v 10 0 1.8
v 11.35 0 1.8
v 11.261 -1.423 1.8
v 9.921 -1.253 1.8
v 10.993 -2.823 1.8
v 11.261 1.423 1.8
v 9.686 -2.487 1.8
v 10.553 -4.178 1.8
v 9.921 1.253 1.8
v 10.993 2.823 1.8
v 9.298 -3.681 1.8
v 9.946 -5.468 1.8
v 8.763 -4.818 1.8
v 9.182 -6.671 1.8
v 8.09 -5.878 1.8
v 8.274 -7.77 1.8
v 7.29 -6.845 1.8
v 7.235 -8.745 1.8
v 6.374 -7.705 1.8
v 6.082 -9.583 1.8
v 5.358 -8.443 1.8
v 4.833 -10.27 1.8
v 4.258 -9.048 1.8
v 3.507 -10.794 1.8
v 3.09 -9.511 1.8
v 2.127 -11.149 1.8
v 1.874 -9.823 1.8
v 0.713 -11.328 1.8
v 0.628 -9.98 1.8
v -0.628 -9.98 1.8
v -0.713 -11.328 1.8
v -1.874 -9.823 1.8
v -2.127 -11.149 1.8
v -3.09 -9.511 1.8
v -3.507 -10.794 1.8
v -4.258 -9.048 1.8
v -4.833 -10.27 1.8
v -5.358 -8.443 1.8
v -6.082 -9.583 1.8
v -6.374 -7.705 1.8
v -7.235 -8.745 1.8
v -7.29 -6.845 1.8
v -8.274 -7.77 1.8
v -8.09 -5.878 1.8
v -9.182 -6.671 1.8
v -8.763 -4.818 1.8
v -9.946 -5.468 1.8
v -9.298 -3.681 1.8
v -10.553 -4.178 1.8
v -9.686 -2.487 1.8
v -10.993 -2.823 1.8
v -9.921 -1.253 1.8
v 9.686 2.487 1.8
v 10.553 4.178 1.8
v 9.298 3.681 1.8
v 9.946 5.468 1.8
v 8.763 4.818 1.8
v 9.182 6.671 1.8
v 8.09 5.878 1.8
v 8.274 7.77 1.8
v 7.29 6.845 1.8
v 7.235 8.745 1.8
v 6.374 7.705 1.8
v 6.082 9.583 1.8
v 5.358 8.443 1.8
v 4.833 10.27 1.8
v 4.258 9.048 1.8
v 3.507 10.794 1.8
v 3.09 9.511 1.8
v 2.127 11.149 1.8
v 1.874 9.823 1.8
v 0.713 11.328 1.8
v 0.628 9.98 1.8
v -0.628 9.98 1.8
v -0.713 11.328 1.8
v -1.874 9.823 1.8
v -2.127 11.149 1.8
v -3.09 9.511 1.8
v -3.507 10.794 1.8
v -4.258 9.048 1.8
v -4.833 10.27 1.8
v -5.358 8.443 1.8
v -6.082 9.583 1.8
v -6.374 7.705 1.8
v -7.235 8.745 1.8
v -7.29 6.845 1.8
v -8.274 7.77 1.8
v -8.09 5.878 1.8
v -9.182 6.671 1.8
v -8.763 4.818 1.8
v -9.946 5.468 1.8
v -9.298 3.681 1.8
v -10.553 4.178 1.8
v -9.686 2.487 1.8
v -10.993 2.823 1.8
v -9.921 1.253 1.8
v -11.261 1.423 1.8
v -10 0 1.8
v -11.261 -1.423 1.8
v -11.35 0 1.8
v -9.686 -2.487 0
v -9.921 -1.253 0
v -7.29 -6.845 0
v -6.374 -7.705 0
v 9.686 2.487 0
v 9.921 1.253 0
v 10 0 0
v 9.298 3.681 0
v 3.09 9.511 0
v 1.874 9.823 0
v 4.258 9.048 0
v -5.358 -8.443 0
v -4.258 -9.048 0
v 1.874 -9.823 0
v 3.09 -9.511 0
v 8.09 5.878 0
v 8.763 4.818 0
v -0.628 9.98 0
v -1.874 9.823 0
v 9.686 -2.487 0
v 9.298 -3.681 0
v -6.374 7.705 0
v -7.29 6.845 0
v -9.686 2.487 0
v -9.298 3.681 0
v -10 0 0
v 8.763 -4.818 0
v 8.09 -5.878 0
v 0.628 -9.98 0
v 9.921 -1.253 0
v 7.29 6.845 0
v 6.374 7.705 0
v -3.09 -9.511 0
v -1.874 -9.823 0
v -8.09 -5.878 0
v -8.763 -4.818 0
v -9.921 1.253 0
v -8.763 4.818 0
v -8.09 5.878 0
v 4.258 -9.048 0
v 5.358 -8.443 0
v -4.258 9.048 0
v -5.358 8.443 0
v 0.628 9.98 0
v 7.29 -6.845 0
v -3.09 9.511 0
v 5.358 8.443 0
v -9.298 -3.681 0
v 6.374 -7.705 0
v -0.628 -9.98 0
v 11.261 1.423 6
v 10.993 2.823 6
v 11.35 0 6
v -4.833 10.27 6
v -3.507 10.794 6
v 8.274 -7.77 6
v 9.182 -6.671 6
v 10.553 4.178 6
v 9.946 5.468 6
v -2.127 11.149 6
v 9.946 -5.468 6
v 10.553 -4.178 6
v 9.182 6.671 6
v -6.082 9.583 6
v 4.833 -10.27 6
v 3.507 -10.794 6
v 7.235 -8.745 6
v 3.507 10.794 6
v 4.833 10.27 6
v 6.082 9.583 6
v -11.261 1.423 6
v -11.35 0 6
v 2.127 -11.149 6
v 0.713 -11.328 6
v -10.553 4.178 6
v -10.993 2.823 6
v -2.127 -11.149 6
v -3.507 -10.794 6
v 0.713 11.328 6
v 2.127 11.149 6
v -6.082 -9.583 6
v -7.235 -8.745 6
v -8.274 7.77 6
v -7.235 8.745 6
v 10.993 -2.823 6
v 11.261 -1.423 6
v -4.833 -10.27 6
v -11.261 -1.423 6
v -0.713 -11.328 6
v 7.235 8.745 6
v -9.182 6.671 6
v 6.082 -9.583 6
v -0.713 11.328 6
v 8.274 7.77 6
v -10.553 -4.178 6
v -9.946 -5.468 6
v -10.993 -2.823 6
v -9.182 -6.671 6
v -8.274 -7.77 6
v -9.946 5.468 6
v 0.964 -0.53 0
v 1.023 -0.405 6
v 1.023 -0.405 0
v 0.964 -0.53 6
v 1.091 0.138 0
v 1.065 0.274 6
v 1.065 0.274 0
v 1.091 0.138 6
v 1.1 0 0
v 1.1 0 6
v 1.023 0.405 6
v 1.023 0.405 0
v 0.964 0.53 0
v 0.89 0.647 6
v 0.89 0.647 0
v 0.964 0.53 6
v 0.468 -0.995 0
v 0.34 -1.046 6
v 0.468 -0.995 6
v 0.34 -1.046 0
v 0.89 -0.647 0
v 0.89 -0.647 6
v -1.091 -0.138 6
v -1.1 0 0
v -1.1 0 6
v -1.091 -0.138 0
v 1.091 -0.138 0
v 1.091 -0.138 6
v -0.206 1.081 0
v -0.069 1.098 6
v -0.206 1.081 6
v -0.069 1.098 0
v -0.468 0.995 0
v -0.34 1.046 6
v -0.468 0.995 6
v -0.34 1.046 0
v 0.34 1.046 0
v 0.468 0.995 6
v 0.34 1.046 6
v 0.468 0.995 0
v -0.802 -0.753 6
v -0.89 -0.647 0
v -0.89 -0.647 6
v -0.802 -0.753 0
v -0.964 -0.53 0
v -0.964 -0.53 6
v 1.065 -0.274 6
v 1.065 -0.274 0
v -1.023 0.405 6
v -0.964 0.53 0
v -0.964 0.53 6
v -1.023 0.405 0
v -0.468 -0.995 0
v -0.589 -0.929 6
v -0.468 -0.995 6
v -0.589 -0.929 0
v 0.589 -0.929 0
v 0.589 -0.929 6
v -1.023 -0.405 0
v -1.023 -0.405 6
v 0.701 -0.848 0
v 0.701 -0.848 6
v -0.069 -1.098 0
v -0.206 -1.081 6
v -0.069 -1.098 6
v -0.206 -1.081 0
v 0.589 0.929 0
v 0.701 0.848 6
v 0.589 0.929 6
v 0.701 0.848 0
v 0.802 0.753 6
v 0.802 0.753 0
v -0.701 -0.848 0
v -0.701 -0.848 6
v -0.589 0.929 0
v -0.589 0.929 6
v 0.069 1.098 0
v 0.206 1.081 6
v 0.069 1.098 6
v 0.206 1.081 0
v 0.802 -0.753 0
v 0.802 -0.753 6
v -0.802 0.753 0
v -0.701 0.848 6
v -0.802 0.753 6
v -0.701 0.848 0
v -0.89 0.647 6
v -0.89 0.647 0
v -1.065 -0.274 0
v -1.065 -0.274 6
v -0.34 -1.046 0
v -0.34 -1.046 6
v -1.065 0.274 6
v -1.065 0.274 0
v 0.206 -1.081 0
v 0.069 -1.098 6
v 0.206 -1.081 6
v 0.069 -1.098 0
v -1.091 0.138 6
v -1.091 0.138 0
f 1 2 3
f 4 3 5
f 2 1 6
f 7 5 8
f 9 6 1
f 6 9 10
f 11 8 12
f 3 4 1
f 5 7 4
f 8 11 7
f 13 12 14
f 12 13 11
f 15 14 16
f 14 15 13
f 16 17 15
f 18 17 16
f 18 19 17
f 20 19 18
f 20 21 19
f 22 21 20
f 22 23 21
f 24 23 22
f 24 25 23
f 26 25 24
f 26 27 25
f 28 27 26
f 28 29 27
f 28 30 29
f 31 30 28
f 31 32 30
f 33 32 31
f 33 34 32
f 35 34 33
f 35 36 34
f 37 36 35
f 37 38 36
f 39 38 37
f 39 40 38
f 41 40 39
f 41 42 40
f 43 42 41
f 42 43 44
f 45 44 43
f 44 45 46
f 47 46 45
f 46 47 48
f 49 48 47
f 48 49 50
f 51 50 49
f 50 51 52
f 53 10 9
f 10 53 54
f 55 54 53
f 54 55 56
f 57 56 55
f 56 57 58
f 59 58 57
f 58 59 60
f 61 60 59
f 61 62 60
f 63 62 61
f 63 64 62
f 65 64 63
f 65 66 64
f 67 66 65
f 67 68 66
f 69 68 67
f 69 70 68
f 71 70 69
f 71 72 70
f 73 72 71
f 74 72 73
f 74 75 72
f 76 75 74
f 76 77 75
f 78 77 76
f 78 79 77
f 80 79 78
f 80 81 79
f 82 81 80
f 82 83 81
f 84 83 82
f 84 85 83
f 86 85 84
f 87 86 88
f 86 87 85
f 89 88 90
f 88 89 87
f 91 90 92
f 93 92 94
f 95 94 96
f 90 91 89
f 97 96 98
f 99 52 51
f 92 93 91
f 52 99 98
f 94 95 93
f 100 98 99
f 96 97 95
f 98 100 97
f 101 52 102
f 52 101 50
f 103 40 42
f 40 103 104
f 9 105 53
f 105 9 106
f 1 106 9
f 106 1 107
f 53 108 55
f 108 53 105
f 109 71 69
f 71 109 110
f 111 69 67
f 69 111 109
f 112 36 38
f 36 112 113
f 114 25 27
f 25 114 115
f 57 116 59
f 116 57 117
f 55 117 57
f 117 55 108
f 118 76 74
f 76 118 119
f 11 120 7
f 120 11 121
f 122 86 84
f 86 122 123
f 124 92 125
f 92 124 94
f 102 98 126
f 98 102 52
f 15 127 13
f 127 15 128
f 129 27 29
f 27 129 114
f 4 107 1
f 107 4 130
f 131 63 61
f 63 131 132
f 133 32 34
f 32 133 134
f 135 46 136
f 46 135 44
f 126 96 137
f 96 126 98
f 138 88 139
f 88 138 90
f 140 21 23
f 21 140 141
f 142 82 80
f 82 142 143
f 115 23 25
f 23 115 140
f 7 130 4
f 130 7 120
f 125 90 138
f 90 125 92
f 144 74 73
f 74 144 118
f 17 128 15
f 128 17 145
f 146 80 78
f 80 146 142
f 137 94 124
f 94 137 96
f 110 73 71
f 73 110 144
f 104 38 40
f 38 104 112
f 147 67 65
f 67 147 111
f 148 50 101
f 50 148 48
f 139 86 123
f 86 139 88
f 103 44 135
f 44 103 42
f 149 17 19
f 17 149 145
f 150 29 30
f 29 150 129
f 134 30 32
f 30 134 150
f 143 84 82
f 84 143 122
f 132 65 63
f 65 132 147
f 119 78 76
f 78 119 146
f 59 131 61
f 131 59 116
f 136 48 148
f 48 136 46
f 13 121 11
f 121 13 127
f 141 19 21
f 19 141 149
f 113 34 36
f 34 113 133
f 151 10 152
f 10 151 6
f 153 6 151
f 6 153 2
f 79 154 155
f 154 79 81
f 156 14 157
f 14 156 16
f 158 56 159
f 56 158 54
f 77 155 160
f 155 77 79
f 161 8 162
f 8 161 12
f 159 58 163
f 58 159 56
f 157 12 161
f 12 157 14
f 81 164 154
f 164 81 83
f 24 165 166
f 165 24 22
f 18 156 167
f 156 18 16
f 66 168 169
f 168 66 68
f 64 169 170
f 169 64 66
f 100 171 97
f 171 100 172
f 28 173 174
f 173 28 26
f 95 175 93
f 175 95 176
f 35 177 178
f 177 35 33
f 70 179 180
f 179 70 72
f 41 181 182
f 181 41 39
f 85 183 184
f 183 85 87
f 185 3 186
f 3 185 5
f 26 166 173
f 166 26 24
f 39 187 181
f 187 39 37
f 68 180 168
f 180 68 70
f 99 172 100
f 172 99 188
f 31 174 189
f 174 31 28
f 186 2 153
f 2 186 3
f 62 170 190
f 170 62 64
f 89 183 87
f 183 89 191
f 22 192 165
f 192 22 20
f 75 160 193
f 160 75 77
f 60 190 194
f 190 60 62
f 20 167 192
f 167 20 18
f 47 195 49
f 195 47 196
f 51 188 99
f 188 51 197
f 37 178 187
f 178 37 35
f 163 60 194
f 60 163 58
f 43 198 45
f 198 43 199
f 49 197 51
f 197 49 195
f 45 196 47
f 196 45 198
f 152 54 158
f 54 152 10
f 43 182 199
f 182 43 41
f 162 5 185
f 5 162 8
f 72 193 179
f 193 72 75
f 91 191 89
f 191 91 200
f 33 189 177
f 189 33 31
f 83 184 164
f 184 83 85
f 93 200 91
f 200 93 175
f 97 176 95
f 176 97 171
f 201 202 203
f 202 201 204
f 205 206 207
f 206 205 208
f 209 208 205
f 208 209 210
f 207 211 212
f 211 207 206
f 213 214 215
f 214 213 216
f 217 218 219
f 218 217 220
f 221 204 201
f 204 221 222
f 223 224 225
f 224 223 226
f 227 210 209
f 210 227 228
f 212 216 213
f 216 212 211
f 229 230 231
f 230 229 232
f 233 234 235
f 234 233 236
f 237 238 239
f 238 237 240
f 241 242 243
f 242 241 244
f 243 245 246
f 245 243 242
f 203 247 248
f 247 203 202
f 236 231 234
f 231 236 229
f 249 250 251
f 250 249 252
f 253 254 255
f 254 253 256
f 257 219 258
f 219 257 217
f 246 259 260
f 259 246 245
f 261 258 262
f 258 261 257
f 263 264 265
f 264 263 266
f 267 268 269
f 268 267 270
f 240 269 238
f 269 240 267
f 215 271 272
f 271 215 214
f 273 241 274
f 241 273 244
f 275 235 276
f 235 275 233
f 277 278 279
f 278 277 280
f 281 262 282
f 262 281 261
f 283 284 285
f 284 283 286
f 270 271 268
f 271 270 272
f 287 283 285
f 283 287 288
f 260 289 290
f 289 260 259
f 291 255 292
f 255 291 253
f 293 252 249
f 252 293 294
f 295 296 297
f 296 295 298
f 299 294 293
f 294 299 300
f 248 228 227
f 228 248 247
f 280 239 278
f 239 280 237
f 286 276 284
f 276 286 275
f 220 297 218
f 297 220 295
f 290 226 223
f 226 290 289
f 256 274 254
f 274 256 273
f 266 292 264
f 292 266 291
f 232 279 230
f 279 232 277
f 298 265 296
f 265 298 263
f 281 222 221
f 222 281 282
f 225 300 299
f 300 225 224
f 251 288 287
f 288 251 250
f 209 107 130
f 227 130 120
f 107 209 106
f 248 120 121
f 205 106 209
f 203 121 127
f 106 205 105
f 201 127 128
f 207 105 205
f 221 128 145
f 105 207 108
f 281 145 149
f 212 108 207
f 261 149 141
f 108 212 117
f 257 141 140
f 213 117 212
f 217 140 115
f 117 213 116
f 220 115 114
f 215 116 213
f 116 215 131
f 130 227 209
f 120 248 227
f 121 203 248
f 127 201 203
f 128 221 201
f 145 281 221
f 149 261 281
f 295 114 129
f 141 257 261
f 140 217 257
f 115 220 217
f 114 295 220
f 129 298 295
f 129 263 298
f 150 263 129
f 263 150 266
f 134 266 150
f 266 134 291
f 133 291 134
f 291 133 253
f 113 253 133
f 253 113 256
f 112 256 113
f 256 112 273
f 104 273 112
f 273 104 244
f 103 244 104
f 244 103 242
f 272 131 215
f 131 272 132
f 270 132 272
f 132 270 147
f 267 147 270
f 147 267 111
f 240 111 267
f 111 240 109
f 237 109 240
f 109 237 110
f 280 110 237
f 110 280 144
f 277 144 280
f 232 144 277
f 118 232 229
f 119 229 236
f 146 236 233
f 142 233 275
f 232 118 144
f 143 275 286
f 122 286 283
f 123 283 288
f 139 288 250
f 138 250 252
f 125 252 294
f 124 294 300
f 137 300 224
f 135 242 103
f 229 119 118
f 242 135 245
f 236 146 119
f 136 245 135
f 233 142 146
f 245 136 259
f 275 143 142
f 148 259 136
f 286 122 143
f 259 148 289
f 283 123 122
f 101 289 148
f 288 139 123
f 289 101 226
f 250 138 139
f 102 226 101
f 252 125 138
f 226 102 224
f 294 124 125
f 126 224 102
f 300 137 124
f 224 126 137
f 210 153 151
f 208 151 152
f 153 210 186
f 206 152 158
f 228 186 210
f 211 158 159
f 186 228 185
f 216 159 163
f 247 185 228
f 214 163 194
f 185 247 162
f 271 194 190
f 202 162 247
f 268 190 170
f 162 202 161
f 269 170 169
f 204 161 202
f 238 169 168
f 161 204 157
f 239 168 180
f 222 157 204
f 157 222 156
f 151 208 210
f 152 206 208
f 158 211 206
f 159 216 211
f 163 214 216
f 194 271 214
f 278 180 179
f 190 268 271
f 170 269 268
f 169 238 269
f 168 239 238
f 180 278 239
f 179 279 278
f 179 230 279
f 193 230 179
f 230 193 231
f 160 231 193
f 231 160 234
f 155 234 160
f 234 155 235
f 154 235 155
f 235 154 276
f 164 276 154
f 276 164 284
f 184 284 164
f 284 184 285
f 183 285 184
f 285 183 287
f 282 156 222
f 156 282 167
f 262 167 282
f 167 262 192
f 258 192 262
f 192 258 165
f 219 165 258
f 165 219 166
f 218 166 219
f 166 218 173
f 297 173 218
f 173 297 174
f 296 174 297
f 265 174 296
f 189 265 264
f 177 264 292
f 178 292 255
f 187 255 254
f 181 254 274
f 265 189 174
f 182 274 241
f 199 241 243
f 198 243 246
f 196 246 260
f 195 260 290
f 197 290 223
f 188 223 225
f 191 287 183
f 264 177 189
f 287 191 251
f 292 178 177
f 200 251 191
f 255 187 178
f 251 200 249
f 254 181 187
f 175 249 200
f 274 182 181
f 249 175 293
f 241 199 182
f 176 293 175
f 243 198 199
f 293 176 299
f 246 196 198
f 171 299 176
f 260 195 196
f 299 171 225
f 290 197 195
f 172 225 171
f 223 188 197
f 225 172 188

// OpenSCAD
$fn = 50;


difference() {
	union() {
		*color(alpha = 1.0000000000, c = "gray") {
			translate(v = [0, 7, 0]) {
				linear_extrude(height = 12) {
					text(font = "Arial:style=Bold", halign = "center", size = 4.5000000000, text = "COMMENT bearing_plate_plate", valign = "center");
				}
			}
		}
		*color(alpha = 1.0000000000, c = "gray") {
			translate(v = [0, 14, 0]) {
				linear_extrude(height = 12) {
					text(font = "Arial:style=Bold", halign = "center", size = 4.5000000000, text = "COMMENT description oobb_cylinder_shape_p_type_12_depth_3_width_12_height_12_thickness_motor_servo_micro_01_shaft_p_t_12.0_radius_all_mode", valign = "center");
				}
			}
		}
		translate(v = [0, 0, -6.0000000000]) {
			cylinder(h = 12, r = 12.0000000000);
		}
		*color(alpha = 1.0000000000, c = "gray") {
			translate(v = [0, 7, 0]) {
				linear_extrude(height = 1) {
					text(font = "Arial:style=Bold", halign = "center", size = 4.5000000000, text = "COMMENT bearing_plate_slice", valign = "center");
				}
			}
		}
	}
	union() {
		translate(v = [18.0000000000, 0, -6.0000000000]) {
			rotate(a = [0, 180, 30.0000000000]) {
				difference() {
					union() {
						translate(v = [0, 0, -12.0000000000]) {
							cylinder(h = 12, r = 1.5000000000);
						}
						translate(v = [0, 0, -12.0000000000]) {
							linear_extrude(height = 2.5000000000) {
								polygon(points = [[3.4620000000, 0.0000000000], [1.7310000000, 2.9981799479], [-1.7310000000, 2.9981799479], [-3.4620000000, 0.0000000000], [-1.7310000000, -2.9981799479], [1.7310000000, -2.9981799479]]);
							}
						}
						translate(v = [-1.7500000000, -3.2500000000, -9.5000000000]) {
							cube(size = [3.5000000000, 6.5000000000, 0.3000000000]);
						}
						translate(v = [-1.7500000000, -1.7500000000, -9.2000000000]) {
							cube(size = [3.5000000000, 3.5000000000, 0.3000000000]);
						}
						translate(v = [-1.7500000000, -3.2500000000, -12.3000000000]) {
							cube(size = [3.5000000000, 6.5000000000, 0.3000000000]);
						}
						translate(v = [-1.7500000000, -1.7500000000, -12.6000000000]) {
							cube(size = [3.5000000000, 3.5000000000, 0.3000000000]);
						}
						translate(v = [0, 0, -0.9500000000]) {
							cylinder(r1 = 1.8000000000, r2 = 3.6000000000);
						}
						translate(v = [0, 0, -12.0000000000]) {
							cylinder(h = 12, r = 1.8000000000);
						}
						translate(v = [0, 0, -12.0000000000]) {
							linear_extrude(height = 2.5000000000) {
								polygon(points = [[3.4620000000, 0.0000000000], [1.7310000000, 2.9981799479], [-1.7310000000, 2.9981799479], [-3.4620000000, 0.0000000000], [-1.7310000000, -2.9981799479], [1.7310000000, -2.9981799479]]);
							}
						}
						translate(v = [-1.7500000000, -3.2500000000, -9.5000000000]) {
							cube(size = [3.5000000000, 6.5000000000, 0.3000000000]);
						}
						translate(v = [-1.7500000000, -1.7500000000, -9.2000000000]) {
							cube(size = [3.5000000000, 3.5000000000, 0.3000000000]);
						}
						translate(v = [-1.7500000000, -3.2500000000, -12.3000000000]) {
							cube(size = [3.5000000000, 6.5000000000, 0.3000000000]);
						}
						translate(v = [-1.7500000000, -1.7500000000, -12.6000000000]) {
							cube(size = [3.5000000000, 3.5000000000, 0.3000000000]);
						}
						translate(v = [0, 0, -12.0000000000]) {
							cylinder(h = 12, r = 1.5000000000);
						}
						translate(v = [0, 0, -12.0000000000]) {
							linear_extrude(height = 2.5000000000) {
								polygon(points = [[3.4620000000, 0.0000000000], [1.7310000000, 2.9981799479], [-1.7310000000, 2.9981799479], [-3.4620000000, 0.0000000000], [-1.7310000000, -2.9981799479], [1.7310000000, -2.9981799479]]);
							}
						}
						translate(v = [-1.7500000000, -3.2500000000, -9.5000000000]) {
							cube(size = [3.5000000000, 6.5000000000, 0.3000000000]);
						}
						translate(v = [-1.7500000000, -1.7500000000, -9.2000000000]) {
							cube(size = [3.5000000000, 3.5000000000, 0.3000000000]);
						}
						translate(v = [-1.7500000000, -3.2500000000, -12.3000000000]) {
							cube(size = [3.5000000000, 6.5000000000, 0.3000000000]);
						}
						translate(v = [-1.7500000000, -1.7500000000, -12.6000000000]) {
							cube(size = [3.5000000000, 3.5000000000, 0.3000000000]);
						}
					}
					union();
				}
			}
		}
		translate(v = [-18.0000000000, 0, -6.0000000000]) {
			rotate(a = [0, 180, 30.0000000000]) {
				difference() {
					union() {
						translate(v = [0, 0, -12.0000000000]) {
							cylinder(h = 12, r = 1.5000000000);
						}
						translate(v = [0, 0, -12.0000000000]) {
							linear_extrude(height = 2.5000000000) {
								polygon(points = [[3.4620000000, 0.0000000000], [1.7310000000, 2.9981799479], [-1.7310000000, 2.9981799479], [-3.4620000000, 0.0000000000], [-1.7310000000, -2.9981799479], [1.7310000000, -2.9981799479]]);
							}
						}
						translate(v = [-1.7500000000, -3.2500000000, -9.5000000000]) {
							cube(size = [3.5000000000, 6.5000000000, 0.3000000000]);
						}
						translate(v = [-1.7500000000, -1.7500000000, -9.2000000000]) {
							cube(size = [3.5000000000, 3.5000000000, 0.3000000000]);
						}
						translate(v = [-1.7500000000, -3.2500000000, -12.3000000000]) {
							cube(size = [3.5000000000, 6.5000000000, 0.3000000000]);
						}
						translate(v = [-1.7500000000, -1.7500000000, -12.6000000000]) {
							cube(size = [3.5000000000, 3.5000000000, 0.3000000000]);
						}
						translate(v = [0, 0, -0.9500000000]) {
							cylinder(r1 = 1.8000000000, r2 = 3.6000000000);
						}
						translate(v = [0, 0, -12.0000000000]) {
							cylinder(h = 12, r = 1.8000000000);
						}
						translate(v = [0, 0, -12.0000000000]) {
							linear_extrude(height = 2.5000000000) {
								polygon(points = [[3.4620000000, 0.0000000000], [1.7310000000, 2.9981799479], [-1.7310000000, 2.9981799479], [-3.4620000000, 0.0000000000], [-1.7310000000, -2.9981799479], [1.7310000000, -2.9981799479]]);
							}
						}
						translate(v = [-1.7500000000, -3.2500000000, -9.5000000000]) {
							cube(size = [3.5000000000, 6.5000000000, 0.3000000000]);
						}
						translate(v = [-1.7500000000, -1.7500000000, -9.2000000000]) {
							cube(size = [3.5000000000, 3.5000000000, 0.3000000000]);
						}
						translate(v = [-1.7500000000, -3.2500000000, -12.3000000000]) {
							cube(size = [3.5000000000, 6.5000000000, 0.3000000000]);
						}
						translate(v = [-1.7500000000, -1.7500000000, -12.6000000000]) {
							cube(size = [3.5000000000, 3.5000000000, 0.3000000000]);
						}
						translate(v = [0, 0, -12.0000000000]) {
							cylinder(h = 12, r = 1.5000000000);
						}
						translate(v = [0, 0, -12.0000000000]) {
							linear_extrude(height = 2.5000000000) {
								polygon(points = [[3.4620000000, 0.0000000000], [1.7310000000, 2.9981799479], [-1.7310000000, 2.9981799479], [-3.4620000000, 0.0000000000], [-1.7310000000, -2.9981799479], [1.7310000000, -2.9981799479]]);
							}
						}
						translate(v = [-1.7500000000, -3.2500000000, -9.5000000000]) {
							cube(size = [3.5000000000, 6.5000000000, 0.3000000000]);
						}
						translate(v = [-1.7500000000, -1.7500000000, -9.2000000000]) {
							cube(size = [3.5000000000, 3.5000000000, 0.3000000000]);
						}
						translate(v = [-1.7500000000, -3.2500000000, -12.3000000000]) {
							cube(size = [3.5000000000, 6.5000000000, 0.3000000000]);
						}
						translate(v = [-1.7500000000, -1.7500000000, -12.6000000000]) {
							cube(size = [3.5000000000, 3.5000000000, 0.3000000000]);
						}
					}
					union();
				}
			}
		}
		translate(v = [0, 18.0000000000, 6.0000000000]) {
			rotate(a = [0, 0, 0]) {
				difference() {
					union() {
						translate(v = [0, 0, -12.0000000000]) {
							cylinder(h = 12, r = 1.5000000000);
						}
						translate(v = [0, 0, -12.0000000000]) {
							linear_extrude(height = 2.5000000000) {
								polygon(points = [[3.4620000000, 0.0000000000], [1.7310000000, 2.9981799479], [-1.7310000000, 2.9981799479], [-3.4620000000, 0.0000000000], [-1.7310000000, -2.9981799479], [1.7310000000, -2.9981799479]]);
							}
						}
						translate(v = [-1.7500000000, -3.2500000000, -9.5000000000]) {
							cube(size = [3.5000000000, 6.5000000000, 0.3000000000]);
						}
						translate(v = [-1.7500000000, -1.7500000000, -9.2000000000]) {
							cube(size = [3.5000000000, 3.5000000000, 0.3000000000]);
						}
						translate(v = [-1.7500000000, -3.2500000000, -12.3000000000]) {
							cube(size = [3.5000000000, 6.5000000000, 0.3000000000]);
						}
						translate(v = [-1.7500000000, -1.7500000000, -12.6000000000]) {
							cube(size = [3.5000000000, 3.5000000000, 0.3000000000]);
						}
						translate(v = [0, 0, -0.9500000000]) {
							cylinder(r1 = 1.8000000000, r2 = 3.6000000000);
						}
						translate(v = [0, 0, -12.0000000000]) {
							cylinder(h = 12, r = 1.8000000000);
						}
						translate(v = [0, 0, -12.0000000000]) {
							linear_extrude(height = 2.5000000000) {
								polygon(points = [[3.4620000000, 0.0000000000], [1.7310000000, 2.9981799479], [-1.7310000000, 2.9981799479], [-3.4620000000, 0.0000000000], [-1.7310000000, -2.9981799479], [1.7310000000, -2.9981799479]]);
							}
						}
						translate(v = [-1.7500000000, -3.2500000000, -9.5000000000]) {
							cube(size = [3.5000000000, 6.5000000000, 0.3000000000]);
						}
						translate(v = [-1.7500000000, -1.7500000000, -9.2000000000]) {
							cube(size = [3.5000000000, 3.5000000000, 0.3000000000]);
						}
						translate(v = [-1.7500000000, -3.2500000000, -12.3000000000]) {
							cube(size = [3.5000000000, 6.5000000000, 0.3000000000]);
						}
						translate(v = [-1.7500000000, -1.7500000000, -12.6000000000]) {
							cube(size = [3.5000000000, 3.5000000000, 0.3000000000]);
						}
						translate(v = [0, 0, -12.0000000000]) {
							cylinder(h = 12, r = 1.5000000000);
						}
						translate(v = [0, 0, -12.0000000000]) {
							linear_extrude(height = 2.5000000000) {
								polygon(points = [[3.4620000000, 0.0000000000], [1.7310000000, 2.9981799479], [-1.7310000000, 2.9981799479], [-3.4620000000, 0.0000000000], [-1.7310000000, -2.9981799479], [1.7310000000, -2.9981799479]]);
							}
						}
						translate(v = [-1.7500000000, -3.2500000000, -9.5000000000]) {
							cube(size = [3.5000000000, 6.5000000000, 0.3000000000]);
						}
						translate(v = [-1.7500000000, -1.7500000000, -9.2000000000]) {
							cube(size = [3.5000000000, 3.5000000000, 0.3000000000]);
						}
						translate(v = [-1.7500000000, -3.2500000000, -12.3000000000]) {
							cube(size = [3.5000000000, 6.5000000000, 0.3000000000]);
						}
						translate(v = [-1.7500000000, -1.7500000000, -12.6000000000]) {
							cube(size = [3.5000000000, 3.5000000000, 0.3000000000]);
						}
					}
					union();
				}
			}
		}
		translate(v = [0, -18.0000000000, 6.0000000000]) {
			rotate(a = [0, 0, 0]) {
				difference() {
					union() {
						translate(v = [0, 0, -12.0000000000]) {
							cylinder(h = 12, r = 1.5000000000);
						}
						translate(v = [0, 0, -12.0000000000]) {
							linear_extrude(height = 2.5000000000) {
								polygon(points = [[3.4620000000, 0.0000000000], [1.7310000000, 2.9981799479], [-1.7310000000, 2.9981799479], [-3.4620000000, 0.0000000000], [-1.7310000000, -2.9981799479], [1.7310000000, -2.9981799479]]);
							}
						}
						translate(v = [-1.7500000000, -3.2500000000, -9.5000000000]) {
							cube(size = [3.5000000000, 6.5000000000, 0.3000000000]);
						}
						translate(v = [-1.7500000000, -1.7500000000, -9.2000000000]) {
							cube(size = [3.5000000000, 3.5000000000, 0.3000000000]);
						}
						translate(v = [-1.7500000000, -3.2500000000, -12.3000000000]) {
							cube(size = [3.5000000000, 6.5000000000, 0.3000000000]);
						}
						translate(v = [-1.7500000000, -1.7500000000, -12.6000000000]) {
							cube(size = [3.5000000000, 3.5000000000, 0.3000000000]);
						}
						translate(v = [0, 0, -0.9500000000]) {
							cylinder(r1 = 1.8000000000, r2 = 3.6000000000);
						}
						translate(v = [0, 0, -12.0000000000]) {
							cylinder(h = 12, r = 1.8000000000);
						}
						translate(v = [0, 0, -12.0000000000]) {
							linear_extrude(height = 2.5000000000) {
								polygon(points = [[3.4620000000, 0.0000000000], [1.7310000000, 2.9981799479], [-1.7310000000, 2.9981799479], [-3.4620000000, 0.0000000000], [-1.7310000000, -2.9981799479], [1.7310000000, -2.9981799479]]);
							}
						}
						translate(v = [-1.7500000000, -3.2500000000, -9.5000000000]) {
							cube(size = [3.5000000000, 6.5000000000, 0.3000000000]);
						}
						translate(v = [-1.7500000000, -1.7500000000, -9.2000000000]) {
							cube(size = [3.5000000000, 3.5000000000, 0.3000000000]);
						}
						translate(v = [-1.7500000000, -3.2500000000, -12.3000000000]) {
							cube(size = [3.5000000000, 6.5000000000, 0.3000000000]);
						}
						translate(v = [-1.7500000000, -1.7500000000, -12.6000000000]) {
							cube(size = [3.5000000000, 3.5000000000, 0.3000000000]);
						}
						translate(v = [0, 0, -12.0000000000]) {
							cylinder(h = 12, r = 1.5000000000);
						}
						translate(v = [0, 0, -12.0000000000]) {
							linear_extrude(height = 2.5000000000) {
								polygon(points = [[3.4620000000, 0.0000000000], [1.7310000000, 2.9981799479], [-1.7310000000, 2.9981799479], [-3.4620000000, 0.0000000000], [-1.7310000000, -2.9981799479], [1.7310000000, -2.9981799479]]);
							}
						}
						translate(v = [-1.7500000000, -3.2500000000, -9.5000000000]) {
							cube(size = [3.5000000000, 6.5000000000, 0.3000000000]);
						}
						translate(v = [-1.7500000000, -1.7500000000, -9.2000000000]) {
							cube(size = [3.5000000000, 3.5000000000, 0.3000000000]);
						}
						translate(v = [-1.7500000000, -3.2500000000, -12.3000000000]) {
							cube(size = [3.5000000000, 6.5000000000, 0.3000000000]);
						}
						translate(v = [-1.7500000000, -1.7500000000, -12.6000000000]) {
							cube(size = [3.5000000000, 3.5000000000, 0.3000000000]);
						}
					}
					union();
				}
			}
		}
		*color(alpha = 1.0000000000, c = "gray") {
			translate(v = [0, 14, 0]) {
				linear_extrude(height = 3) {
					text(font = "Arial:style=Bold", halign = "center", size = 4.5000000000, text = "COMMENT description oobb_bearing_shape_n_type_12_depth_3_width_3_height_12_thickness_motor_servo_micro_01_shaft_6704_bearing", valign = "center");
				}
			}
		}
		translate(v = [0, 0, -1.8000000000]) {
			union() {
				difference() {
					cylinder(h = 3.6000000000, r = 13.7000000000);
					cylinder(h = 3.6000000000, r = 10.0000000000);
				}
				difference() {
					translate(v = [0, 0, -50]) {
						cylinder(h = 100, r = 12.3500000000);
					}
					translate(v = [0, 0, -50]) {
						cylinder(h = 100, r = 11.3500000000);
					}
				}
			}
		}
		*color(alpha = 1.0000000000, c = "gray") {
			translate(v = [0, 14, 0]) {
				linear_extrude(height = 3) {
					text(font = "Arial:style=Bold", halign = "center", size = 4.5000000000, text = "COMMENT description oobb_holes_shape_n_type_m6_radius_name_3_width_3_height_12_thickness_motor_servo_micro_01_shaft_perimeter_miss_middle_holes", valign = "center");
				}
			}
		}
		translate(v = [-15.0000000000, -15.0000000000, -50.0000000000]) {
			cylinder(h = 100, r = 3.2500000000);
		}
		translate(v = [-15.0000000000, 15.0000000000, -50.0000000000]) {
			cylinder(h = 100, r = 3.2500000000);
		}
		translate(v = [15.0000000000, -15.0000000000, -50.0000000000]) {
			cylinder(h = 100, r = 3.2500000000);
		}
		translate(v = [15.0000000000, 15.0000000000, -50.0000000000]) {
			cylinder(h = 100, r = 3.2500000000);
		}
		*color(alpha = 1.0000000000, c = "gray") {
			translate(v = [0, 14, 0]) {
				linear_extrude(height = 3) {
					text(font = "Arial:style=Bold", halign = "center", size = 4.5000000000, text = "COMMENT description oobb_motor_servo_micro_01_shape_n_type_3_width_3_height_12_thickness_motor_servo_micro_01_shaft_shaft_part", valign = "center");
				}
			}
		}
		translate(v = [0, 0, -6.0000000000]) {
			cylinder(h = 3, r1 = 2.5000000000, r2 = 2.4000000000);
		}
		translate(v = [0, 0, -50.0000000000]) {
			cylinder(h = 100, r = 1.1000000000);
		}
		*color(alpha = 1.0000000000, c = "gray") {
			translate(v = [18.0000000000, 14, -6.0000000000]) {
				rotate(a = [0, 180, 30.0000000000]) {
					linear_extrude(height = 3) {
						text(font = "Arial:style=Bold", halign = "center", size = 4.5000000000, text = "COMMENT description oobb_screw_countersunk_shape_n_type_m3_radius_name_12_depth_18.0_0_-6.0_pos_3_width_3_height_12_thickness_motor_servo_micro_01_shaft_0_180_30.0_rot_true_nut_true_overhang", valign = "center");
					}
				}
			}
		}
		*color(alpha = 1.0000000000, c = "gray") {
			translate(v = [-18.0000000000, 14, -6.0000000000]) {
				rotate(a = [0, 180, 30.0000000000]) {
					linear_extrude(height = 3) {
						text(font = "Arial:style=Bold", halign = "center", size = 4.5000000000, text = "COMMENT description oobb_screw_countersunk_shape_n_type_m3_radius_name_12_depth_-18.0_0_-6.0_pos_3_width_3_height_12_thickness_motor_servo_micro_01_shaft_0_180_30.0_rot_true_nut_true_overhang", valign = "center");
					}
				}
			}
		}
		*color(alpha = 1.0000000000, c = "gray") {
			translate(v = [0, 32.0000000000, 6.0000000000]) {
				linear_extrude(height = 3) {
					text(font = "Arial:style=Bold", halign = "center", size = 4.5000000000, text = "COMMENT description oobb_screw_countersunk_shape_n_type_m3_radius_name_12_depth_0_18.0_6.0_pos_3_width_3_height_12_thickness_motor_servo_micro_01_shaft_0_0_0_rot_true_nut_true_overhang", valign = "center");
				}
			}
		}
		*color(alpha = 1.0000000000, c = "gray") {
			translate(v = [0, -4.0000000000, 6.0000000000]) {
				linear_extrude(height = 3) {
					text(font = "Arial:style=Bold", halign = "center", size = 4.5000000000, text = "COMMENT description oobb_screw_countersunk_shape_n_type_m3_radius_name_12_depth_0_-18.0_6.0_pos_3_width_3_height_12_thickness_motor_servo_micro_01_shaft_0_0_0_rot_true_nut_true_overhang", valign = "center");
				}
			}
		}
		*color(alpha = 1.0000000000, c = "gray") {
			translate(v = [0, 14, 0]) {
				linear_extrude(height = 1) {
					text(font = "Arial:style=Bold", halign = "center", size = 4.5000000000, text = "COMMENT description oobb_slice_shape_n_type_3dpr_mode_top_zz", valign = "center");
				}
			}
		}
		translate(v = [-250, -250, -500]) {
			cube(size = [500, 500, 500]);
		}
	}
}
